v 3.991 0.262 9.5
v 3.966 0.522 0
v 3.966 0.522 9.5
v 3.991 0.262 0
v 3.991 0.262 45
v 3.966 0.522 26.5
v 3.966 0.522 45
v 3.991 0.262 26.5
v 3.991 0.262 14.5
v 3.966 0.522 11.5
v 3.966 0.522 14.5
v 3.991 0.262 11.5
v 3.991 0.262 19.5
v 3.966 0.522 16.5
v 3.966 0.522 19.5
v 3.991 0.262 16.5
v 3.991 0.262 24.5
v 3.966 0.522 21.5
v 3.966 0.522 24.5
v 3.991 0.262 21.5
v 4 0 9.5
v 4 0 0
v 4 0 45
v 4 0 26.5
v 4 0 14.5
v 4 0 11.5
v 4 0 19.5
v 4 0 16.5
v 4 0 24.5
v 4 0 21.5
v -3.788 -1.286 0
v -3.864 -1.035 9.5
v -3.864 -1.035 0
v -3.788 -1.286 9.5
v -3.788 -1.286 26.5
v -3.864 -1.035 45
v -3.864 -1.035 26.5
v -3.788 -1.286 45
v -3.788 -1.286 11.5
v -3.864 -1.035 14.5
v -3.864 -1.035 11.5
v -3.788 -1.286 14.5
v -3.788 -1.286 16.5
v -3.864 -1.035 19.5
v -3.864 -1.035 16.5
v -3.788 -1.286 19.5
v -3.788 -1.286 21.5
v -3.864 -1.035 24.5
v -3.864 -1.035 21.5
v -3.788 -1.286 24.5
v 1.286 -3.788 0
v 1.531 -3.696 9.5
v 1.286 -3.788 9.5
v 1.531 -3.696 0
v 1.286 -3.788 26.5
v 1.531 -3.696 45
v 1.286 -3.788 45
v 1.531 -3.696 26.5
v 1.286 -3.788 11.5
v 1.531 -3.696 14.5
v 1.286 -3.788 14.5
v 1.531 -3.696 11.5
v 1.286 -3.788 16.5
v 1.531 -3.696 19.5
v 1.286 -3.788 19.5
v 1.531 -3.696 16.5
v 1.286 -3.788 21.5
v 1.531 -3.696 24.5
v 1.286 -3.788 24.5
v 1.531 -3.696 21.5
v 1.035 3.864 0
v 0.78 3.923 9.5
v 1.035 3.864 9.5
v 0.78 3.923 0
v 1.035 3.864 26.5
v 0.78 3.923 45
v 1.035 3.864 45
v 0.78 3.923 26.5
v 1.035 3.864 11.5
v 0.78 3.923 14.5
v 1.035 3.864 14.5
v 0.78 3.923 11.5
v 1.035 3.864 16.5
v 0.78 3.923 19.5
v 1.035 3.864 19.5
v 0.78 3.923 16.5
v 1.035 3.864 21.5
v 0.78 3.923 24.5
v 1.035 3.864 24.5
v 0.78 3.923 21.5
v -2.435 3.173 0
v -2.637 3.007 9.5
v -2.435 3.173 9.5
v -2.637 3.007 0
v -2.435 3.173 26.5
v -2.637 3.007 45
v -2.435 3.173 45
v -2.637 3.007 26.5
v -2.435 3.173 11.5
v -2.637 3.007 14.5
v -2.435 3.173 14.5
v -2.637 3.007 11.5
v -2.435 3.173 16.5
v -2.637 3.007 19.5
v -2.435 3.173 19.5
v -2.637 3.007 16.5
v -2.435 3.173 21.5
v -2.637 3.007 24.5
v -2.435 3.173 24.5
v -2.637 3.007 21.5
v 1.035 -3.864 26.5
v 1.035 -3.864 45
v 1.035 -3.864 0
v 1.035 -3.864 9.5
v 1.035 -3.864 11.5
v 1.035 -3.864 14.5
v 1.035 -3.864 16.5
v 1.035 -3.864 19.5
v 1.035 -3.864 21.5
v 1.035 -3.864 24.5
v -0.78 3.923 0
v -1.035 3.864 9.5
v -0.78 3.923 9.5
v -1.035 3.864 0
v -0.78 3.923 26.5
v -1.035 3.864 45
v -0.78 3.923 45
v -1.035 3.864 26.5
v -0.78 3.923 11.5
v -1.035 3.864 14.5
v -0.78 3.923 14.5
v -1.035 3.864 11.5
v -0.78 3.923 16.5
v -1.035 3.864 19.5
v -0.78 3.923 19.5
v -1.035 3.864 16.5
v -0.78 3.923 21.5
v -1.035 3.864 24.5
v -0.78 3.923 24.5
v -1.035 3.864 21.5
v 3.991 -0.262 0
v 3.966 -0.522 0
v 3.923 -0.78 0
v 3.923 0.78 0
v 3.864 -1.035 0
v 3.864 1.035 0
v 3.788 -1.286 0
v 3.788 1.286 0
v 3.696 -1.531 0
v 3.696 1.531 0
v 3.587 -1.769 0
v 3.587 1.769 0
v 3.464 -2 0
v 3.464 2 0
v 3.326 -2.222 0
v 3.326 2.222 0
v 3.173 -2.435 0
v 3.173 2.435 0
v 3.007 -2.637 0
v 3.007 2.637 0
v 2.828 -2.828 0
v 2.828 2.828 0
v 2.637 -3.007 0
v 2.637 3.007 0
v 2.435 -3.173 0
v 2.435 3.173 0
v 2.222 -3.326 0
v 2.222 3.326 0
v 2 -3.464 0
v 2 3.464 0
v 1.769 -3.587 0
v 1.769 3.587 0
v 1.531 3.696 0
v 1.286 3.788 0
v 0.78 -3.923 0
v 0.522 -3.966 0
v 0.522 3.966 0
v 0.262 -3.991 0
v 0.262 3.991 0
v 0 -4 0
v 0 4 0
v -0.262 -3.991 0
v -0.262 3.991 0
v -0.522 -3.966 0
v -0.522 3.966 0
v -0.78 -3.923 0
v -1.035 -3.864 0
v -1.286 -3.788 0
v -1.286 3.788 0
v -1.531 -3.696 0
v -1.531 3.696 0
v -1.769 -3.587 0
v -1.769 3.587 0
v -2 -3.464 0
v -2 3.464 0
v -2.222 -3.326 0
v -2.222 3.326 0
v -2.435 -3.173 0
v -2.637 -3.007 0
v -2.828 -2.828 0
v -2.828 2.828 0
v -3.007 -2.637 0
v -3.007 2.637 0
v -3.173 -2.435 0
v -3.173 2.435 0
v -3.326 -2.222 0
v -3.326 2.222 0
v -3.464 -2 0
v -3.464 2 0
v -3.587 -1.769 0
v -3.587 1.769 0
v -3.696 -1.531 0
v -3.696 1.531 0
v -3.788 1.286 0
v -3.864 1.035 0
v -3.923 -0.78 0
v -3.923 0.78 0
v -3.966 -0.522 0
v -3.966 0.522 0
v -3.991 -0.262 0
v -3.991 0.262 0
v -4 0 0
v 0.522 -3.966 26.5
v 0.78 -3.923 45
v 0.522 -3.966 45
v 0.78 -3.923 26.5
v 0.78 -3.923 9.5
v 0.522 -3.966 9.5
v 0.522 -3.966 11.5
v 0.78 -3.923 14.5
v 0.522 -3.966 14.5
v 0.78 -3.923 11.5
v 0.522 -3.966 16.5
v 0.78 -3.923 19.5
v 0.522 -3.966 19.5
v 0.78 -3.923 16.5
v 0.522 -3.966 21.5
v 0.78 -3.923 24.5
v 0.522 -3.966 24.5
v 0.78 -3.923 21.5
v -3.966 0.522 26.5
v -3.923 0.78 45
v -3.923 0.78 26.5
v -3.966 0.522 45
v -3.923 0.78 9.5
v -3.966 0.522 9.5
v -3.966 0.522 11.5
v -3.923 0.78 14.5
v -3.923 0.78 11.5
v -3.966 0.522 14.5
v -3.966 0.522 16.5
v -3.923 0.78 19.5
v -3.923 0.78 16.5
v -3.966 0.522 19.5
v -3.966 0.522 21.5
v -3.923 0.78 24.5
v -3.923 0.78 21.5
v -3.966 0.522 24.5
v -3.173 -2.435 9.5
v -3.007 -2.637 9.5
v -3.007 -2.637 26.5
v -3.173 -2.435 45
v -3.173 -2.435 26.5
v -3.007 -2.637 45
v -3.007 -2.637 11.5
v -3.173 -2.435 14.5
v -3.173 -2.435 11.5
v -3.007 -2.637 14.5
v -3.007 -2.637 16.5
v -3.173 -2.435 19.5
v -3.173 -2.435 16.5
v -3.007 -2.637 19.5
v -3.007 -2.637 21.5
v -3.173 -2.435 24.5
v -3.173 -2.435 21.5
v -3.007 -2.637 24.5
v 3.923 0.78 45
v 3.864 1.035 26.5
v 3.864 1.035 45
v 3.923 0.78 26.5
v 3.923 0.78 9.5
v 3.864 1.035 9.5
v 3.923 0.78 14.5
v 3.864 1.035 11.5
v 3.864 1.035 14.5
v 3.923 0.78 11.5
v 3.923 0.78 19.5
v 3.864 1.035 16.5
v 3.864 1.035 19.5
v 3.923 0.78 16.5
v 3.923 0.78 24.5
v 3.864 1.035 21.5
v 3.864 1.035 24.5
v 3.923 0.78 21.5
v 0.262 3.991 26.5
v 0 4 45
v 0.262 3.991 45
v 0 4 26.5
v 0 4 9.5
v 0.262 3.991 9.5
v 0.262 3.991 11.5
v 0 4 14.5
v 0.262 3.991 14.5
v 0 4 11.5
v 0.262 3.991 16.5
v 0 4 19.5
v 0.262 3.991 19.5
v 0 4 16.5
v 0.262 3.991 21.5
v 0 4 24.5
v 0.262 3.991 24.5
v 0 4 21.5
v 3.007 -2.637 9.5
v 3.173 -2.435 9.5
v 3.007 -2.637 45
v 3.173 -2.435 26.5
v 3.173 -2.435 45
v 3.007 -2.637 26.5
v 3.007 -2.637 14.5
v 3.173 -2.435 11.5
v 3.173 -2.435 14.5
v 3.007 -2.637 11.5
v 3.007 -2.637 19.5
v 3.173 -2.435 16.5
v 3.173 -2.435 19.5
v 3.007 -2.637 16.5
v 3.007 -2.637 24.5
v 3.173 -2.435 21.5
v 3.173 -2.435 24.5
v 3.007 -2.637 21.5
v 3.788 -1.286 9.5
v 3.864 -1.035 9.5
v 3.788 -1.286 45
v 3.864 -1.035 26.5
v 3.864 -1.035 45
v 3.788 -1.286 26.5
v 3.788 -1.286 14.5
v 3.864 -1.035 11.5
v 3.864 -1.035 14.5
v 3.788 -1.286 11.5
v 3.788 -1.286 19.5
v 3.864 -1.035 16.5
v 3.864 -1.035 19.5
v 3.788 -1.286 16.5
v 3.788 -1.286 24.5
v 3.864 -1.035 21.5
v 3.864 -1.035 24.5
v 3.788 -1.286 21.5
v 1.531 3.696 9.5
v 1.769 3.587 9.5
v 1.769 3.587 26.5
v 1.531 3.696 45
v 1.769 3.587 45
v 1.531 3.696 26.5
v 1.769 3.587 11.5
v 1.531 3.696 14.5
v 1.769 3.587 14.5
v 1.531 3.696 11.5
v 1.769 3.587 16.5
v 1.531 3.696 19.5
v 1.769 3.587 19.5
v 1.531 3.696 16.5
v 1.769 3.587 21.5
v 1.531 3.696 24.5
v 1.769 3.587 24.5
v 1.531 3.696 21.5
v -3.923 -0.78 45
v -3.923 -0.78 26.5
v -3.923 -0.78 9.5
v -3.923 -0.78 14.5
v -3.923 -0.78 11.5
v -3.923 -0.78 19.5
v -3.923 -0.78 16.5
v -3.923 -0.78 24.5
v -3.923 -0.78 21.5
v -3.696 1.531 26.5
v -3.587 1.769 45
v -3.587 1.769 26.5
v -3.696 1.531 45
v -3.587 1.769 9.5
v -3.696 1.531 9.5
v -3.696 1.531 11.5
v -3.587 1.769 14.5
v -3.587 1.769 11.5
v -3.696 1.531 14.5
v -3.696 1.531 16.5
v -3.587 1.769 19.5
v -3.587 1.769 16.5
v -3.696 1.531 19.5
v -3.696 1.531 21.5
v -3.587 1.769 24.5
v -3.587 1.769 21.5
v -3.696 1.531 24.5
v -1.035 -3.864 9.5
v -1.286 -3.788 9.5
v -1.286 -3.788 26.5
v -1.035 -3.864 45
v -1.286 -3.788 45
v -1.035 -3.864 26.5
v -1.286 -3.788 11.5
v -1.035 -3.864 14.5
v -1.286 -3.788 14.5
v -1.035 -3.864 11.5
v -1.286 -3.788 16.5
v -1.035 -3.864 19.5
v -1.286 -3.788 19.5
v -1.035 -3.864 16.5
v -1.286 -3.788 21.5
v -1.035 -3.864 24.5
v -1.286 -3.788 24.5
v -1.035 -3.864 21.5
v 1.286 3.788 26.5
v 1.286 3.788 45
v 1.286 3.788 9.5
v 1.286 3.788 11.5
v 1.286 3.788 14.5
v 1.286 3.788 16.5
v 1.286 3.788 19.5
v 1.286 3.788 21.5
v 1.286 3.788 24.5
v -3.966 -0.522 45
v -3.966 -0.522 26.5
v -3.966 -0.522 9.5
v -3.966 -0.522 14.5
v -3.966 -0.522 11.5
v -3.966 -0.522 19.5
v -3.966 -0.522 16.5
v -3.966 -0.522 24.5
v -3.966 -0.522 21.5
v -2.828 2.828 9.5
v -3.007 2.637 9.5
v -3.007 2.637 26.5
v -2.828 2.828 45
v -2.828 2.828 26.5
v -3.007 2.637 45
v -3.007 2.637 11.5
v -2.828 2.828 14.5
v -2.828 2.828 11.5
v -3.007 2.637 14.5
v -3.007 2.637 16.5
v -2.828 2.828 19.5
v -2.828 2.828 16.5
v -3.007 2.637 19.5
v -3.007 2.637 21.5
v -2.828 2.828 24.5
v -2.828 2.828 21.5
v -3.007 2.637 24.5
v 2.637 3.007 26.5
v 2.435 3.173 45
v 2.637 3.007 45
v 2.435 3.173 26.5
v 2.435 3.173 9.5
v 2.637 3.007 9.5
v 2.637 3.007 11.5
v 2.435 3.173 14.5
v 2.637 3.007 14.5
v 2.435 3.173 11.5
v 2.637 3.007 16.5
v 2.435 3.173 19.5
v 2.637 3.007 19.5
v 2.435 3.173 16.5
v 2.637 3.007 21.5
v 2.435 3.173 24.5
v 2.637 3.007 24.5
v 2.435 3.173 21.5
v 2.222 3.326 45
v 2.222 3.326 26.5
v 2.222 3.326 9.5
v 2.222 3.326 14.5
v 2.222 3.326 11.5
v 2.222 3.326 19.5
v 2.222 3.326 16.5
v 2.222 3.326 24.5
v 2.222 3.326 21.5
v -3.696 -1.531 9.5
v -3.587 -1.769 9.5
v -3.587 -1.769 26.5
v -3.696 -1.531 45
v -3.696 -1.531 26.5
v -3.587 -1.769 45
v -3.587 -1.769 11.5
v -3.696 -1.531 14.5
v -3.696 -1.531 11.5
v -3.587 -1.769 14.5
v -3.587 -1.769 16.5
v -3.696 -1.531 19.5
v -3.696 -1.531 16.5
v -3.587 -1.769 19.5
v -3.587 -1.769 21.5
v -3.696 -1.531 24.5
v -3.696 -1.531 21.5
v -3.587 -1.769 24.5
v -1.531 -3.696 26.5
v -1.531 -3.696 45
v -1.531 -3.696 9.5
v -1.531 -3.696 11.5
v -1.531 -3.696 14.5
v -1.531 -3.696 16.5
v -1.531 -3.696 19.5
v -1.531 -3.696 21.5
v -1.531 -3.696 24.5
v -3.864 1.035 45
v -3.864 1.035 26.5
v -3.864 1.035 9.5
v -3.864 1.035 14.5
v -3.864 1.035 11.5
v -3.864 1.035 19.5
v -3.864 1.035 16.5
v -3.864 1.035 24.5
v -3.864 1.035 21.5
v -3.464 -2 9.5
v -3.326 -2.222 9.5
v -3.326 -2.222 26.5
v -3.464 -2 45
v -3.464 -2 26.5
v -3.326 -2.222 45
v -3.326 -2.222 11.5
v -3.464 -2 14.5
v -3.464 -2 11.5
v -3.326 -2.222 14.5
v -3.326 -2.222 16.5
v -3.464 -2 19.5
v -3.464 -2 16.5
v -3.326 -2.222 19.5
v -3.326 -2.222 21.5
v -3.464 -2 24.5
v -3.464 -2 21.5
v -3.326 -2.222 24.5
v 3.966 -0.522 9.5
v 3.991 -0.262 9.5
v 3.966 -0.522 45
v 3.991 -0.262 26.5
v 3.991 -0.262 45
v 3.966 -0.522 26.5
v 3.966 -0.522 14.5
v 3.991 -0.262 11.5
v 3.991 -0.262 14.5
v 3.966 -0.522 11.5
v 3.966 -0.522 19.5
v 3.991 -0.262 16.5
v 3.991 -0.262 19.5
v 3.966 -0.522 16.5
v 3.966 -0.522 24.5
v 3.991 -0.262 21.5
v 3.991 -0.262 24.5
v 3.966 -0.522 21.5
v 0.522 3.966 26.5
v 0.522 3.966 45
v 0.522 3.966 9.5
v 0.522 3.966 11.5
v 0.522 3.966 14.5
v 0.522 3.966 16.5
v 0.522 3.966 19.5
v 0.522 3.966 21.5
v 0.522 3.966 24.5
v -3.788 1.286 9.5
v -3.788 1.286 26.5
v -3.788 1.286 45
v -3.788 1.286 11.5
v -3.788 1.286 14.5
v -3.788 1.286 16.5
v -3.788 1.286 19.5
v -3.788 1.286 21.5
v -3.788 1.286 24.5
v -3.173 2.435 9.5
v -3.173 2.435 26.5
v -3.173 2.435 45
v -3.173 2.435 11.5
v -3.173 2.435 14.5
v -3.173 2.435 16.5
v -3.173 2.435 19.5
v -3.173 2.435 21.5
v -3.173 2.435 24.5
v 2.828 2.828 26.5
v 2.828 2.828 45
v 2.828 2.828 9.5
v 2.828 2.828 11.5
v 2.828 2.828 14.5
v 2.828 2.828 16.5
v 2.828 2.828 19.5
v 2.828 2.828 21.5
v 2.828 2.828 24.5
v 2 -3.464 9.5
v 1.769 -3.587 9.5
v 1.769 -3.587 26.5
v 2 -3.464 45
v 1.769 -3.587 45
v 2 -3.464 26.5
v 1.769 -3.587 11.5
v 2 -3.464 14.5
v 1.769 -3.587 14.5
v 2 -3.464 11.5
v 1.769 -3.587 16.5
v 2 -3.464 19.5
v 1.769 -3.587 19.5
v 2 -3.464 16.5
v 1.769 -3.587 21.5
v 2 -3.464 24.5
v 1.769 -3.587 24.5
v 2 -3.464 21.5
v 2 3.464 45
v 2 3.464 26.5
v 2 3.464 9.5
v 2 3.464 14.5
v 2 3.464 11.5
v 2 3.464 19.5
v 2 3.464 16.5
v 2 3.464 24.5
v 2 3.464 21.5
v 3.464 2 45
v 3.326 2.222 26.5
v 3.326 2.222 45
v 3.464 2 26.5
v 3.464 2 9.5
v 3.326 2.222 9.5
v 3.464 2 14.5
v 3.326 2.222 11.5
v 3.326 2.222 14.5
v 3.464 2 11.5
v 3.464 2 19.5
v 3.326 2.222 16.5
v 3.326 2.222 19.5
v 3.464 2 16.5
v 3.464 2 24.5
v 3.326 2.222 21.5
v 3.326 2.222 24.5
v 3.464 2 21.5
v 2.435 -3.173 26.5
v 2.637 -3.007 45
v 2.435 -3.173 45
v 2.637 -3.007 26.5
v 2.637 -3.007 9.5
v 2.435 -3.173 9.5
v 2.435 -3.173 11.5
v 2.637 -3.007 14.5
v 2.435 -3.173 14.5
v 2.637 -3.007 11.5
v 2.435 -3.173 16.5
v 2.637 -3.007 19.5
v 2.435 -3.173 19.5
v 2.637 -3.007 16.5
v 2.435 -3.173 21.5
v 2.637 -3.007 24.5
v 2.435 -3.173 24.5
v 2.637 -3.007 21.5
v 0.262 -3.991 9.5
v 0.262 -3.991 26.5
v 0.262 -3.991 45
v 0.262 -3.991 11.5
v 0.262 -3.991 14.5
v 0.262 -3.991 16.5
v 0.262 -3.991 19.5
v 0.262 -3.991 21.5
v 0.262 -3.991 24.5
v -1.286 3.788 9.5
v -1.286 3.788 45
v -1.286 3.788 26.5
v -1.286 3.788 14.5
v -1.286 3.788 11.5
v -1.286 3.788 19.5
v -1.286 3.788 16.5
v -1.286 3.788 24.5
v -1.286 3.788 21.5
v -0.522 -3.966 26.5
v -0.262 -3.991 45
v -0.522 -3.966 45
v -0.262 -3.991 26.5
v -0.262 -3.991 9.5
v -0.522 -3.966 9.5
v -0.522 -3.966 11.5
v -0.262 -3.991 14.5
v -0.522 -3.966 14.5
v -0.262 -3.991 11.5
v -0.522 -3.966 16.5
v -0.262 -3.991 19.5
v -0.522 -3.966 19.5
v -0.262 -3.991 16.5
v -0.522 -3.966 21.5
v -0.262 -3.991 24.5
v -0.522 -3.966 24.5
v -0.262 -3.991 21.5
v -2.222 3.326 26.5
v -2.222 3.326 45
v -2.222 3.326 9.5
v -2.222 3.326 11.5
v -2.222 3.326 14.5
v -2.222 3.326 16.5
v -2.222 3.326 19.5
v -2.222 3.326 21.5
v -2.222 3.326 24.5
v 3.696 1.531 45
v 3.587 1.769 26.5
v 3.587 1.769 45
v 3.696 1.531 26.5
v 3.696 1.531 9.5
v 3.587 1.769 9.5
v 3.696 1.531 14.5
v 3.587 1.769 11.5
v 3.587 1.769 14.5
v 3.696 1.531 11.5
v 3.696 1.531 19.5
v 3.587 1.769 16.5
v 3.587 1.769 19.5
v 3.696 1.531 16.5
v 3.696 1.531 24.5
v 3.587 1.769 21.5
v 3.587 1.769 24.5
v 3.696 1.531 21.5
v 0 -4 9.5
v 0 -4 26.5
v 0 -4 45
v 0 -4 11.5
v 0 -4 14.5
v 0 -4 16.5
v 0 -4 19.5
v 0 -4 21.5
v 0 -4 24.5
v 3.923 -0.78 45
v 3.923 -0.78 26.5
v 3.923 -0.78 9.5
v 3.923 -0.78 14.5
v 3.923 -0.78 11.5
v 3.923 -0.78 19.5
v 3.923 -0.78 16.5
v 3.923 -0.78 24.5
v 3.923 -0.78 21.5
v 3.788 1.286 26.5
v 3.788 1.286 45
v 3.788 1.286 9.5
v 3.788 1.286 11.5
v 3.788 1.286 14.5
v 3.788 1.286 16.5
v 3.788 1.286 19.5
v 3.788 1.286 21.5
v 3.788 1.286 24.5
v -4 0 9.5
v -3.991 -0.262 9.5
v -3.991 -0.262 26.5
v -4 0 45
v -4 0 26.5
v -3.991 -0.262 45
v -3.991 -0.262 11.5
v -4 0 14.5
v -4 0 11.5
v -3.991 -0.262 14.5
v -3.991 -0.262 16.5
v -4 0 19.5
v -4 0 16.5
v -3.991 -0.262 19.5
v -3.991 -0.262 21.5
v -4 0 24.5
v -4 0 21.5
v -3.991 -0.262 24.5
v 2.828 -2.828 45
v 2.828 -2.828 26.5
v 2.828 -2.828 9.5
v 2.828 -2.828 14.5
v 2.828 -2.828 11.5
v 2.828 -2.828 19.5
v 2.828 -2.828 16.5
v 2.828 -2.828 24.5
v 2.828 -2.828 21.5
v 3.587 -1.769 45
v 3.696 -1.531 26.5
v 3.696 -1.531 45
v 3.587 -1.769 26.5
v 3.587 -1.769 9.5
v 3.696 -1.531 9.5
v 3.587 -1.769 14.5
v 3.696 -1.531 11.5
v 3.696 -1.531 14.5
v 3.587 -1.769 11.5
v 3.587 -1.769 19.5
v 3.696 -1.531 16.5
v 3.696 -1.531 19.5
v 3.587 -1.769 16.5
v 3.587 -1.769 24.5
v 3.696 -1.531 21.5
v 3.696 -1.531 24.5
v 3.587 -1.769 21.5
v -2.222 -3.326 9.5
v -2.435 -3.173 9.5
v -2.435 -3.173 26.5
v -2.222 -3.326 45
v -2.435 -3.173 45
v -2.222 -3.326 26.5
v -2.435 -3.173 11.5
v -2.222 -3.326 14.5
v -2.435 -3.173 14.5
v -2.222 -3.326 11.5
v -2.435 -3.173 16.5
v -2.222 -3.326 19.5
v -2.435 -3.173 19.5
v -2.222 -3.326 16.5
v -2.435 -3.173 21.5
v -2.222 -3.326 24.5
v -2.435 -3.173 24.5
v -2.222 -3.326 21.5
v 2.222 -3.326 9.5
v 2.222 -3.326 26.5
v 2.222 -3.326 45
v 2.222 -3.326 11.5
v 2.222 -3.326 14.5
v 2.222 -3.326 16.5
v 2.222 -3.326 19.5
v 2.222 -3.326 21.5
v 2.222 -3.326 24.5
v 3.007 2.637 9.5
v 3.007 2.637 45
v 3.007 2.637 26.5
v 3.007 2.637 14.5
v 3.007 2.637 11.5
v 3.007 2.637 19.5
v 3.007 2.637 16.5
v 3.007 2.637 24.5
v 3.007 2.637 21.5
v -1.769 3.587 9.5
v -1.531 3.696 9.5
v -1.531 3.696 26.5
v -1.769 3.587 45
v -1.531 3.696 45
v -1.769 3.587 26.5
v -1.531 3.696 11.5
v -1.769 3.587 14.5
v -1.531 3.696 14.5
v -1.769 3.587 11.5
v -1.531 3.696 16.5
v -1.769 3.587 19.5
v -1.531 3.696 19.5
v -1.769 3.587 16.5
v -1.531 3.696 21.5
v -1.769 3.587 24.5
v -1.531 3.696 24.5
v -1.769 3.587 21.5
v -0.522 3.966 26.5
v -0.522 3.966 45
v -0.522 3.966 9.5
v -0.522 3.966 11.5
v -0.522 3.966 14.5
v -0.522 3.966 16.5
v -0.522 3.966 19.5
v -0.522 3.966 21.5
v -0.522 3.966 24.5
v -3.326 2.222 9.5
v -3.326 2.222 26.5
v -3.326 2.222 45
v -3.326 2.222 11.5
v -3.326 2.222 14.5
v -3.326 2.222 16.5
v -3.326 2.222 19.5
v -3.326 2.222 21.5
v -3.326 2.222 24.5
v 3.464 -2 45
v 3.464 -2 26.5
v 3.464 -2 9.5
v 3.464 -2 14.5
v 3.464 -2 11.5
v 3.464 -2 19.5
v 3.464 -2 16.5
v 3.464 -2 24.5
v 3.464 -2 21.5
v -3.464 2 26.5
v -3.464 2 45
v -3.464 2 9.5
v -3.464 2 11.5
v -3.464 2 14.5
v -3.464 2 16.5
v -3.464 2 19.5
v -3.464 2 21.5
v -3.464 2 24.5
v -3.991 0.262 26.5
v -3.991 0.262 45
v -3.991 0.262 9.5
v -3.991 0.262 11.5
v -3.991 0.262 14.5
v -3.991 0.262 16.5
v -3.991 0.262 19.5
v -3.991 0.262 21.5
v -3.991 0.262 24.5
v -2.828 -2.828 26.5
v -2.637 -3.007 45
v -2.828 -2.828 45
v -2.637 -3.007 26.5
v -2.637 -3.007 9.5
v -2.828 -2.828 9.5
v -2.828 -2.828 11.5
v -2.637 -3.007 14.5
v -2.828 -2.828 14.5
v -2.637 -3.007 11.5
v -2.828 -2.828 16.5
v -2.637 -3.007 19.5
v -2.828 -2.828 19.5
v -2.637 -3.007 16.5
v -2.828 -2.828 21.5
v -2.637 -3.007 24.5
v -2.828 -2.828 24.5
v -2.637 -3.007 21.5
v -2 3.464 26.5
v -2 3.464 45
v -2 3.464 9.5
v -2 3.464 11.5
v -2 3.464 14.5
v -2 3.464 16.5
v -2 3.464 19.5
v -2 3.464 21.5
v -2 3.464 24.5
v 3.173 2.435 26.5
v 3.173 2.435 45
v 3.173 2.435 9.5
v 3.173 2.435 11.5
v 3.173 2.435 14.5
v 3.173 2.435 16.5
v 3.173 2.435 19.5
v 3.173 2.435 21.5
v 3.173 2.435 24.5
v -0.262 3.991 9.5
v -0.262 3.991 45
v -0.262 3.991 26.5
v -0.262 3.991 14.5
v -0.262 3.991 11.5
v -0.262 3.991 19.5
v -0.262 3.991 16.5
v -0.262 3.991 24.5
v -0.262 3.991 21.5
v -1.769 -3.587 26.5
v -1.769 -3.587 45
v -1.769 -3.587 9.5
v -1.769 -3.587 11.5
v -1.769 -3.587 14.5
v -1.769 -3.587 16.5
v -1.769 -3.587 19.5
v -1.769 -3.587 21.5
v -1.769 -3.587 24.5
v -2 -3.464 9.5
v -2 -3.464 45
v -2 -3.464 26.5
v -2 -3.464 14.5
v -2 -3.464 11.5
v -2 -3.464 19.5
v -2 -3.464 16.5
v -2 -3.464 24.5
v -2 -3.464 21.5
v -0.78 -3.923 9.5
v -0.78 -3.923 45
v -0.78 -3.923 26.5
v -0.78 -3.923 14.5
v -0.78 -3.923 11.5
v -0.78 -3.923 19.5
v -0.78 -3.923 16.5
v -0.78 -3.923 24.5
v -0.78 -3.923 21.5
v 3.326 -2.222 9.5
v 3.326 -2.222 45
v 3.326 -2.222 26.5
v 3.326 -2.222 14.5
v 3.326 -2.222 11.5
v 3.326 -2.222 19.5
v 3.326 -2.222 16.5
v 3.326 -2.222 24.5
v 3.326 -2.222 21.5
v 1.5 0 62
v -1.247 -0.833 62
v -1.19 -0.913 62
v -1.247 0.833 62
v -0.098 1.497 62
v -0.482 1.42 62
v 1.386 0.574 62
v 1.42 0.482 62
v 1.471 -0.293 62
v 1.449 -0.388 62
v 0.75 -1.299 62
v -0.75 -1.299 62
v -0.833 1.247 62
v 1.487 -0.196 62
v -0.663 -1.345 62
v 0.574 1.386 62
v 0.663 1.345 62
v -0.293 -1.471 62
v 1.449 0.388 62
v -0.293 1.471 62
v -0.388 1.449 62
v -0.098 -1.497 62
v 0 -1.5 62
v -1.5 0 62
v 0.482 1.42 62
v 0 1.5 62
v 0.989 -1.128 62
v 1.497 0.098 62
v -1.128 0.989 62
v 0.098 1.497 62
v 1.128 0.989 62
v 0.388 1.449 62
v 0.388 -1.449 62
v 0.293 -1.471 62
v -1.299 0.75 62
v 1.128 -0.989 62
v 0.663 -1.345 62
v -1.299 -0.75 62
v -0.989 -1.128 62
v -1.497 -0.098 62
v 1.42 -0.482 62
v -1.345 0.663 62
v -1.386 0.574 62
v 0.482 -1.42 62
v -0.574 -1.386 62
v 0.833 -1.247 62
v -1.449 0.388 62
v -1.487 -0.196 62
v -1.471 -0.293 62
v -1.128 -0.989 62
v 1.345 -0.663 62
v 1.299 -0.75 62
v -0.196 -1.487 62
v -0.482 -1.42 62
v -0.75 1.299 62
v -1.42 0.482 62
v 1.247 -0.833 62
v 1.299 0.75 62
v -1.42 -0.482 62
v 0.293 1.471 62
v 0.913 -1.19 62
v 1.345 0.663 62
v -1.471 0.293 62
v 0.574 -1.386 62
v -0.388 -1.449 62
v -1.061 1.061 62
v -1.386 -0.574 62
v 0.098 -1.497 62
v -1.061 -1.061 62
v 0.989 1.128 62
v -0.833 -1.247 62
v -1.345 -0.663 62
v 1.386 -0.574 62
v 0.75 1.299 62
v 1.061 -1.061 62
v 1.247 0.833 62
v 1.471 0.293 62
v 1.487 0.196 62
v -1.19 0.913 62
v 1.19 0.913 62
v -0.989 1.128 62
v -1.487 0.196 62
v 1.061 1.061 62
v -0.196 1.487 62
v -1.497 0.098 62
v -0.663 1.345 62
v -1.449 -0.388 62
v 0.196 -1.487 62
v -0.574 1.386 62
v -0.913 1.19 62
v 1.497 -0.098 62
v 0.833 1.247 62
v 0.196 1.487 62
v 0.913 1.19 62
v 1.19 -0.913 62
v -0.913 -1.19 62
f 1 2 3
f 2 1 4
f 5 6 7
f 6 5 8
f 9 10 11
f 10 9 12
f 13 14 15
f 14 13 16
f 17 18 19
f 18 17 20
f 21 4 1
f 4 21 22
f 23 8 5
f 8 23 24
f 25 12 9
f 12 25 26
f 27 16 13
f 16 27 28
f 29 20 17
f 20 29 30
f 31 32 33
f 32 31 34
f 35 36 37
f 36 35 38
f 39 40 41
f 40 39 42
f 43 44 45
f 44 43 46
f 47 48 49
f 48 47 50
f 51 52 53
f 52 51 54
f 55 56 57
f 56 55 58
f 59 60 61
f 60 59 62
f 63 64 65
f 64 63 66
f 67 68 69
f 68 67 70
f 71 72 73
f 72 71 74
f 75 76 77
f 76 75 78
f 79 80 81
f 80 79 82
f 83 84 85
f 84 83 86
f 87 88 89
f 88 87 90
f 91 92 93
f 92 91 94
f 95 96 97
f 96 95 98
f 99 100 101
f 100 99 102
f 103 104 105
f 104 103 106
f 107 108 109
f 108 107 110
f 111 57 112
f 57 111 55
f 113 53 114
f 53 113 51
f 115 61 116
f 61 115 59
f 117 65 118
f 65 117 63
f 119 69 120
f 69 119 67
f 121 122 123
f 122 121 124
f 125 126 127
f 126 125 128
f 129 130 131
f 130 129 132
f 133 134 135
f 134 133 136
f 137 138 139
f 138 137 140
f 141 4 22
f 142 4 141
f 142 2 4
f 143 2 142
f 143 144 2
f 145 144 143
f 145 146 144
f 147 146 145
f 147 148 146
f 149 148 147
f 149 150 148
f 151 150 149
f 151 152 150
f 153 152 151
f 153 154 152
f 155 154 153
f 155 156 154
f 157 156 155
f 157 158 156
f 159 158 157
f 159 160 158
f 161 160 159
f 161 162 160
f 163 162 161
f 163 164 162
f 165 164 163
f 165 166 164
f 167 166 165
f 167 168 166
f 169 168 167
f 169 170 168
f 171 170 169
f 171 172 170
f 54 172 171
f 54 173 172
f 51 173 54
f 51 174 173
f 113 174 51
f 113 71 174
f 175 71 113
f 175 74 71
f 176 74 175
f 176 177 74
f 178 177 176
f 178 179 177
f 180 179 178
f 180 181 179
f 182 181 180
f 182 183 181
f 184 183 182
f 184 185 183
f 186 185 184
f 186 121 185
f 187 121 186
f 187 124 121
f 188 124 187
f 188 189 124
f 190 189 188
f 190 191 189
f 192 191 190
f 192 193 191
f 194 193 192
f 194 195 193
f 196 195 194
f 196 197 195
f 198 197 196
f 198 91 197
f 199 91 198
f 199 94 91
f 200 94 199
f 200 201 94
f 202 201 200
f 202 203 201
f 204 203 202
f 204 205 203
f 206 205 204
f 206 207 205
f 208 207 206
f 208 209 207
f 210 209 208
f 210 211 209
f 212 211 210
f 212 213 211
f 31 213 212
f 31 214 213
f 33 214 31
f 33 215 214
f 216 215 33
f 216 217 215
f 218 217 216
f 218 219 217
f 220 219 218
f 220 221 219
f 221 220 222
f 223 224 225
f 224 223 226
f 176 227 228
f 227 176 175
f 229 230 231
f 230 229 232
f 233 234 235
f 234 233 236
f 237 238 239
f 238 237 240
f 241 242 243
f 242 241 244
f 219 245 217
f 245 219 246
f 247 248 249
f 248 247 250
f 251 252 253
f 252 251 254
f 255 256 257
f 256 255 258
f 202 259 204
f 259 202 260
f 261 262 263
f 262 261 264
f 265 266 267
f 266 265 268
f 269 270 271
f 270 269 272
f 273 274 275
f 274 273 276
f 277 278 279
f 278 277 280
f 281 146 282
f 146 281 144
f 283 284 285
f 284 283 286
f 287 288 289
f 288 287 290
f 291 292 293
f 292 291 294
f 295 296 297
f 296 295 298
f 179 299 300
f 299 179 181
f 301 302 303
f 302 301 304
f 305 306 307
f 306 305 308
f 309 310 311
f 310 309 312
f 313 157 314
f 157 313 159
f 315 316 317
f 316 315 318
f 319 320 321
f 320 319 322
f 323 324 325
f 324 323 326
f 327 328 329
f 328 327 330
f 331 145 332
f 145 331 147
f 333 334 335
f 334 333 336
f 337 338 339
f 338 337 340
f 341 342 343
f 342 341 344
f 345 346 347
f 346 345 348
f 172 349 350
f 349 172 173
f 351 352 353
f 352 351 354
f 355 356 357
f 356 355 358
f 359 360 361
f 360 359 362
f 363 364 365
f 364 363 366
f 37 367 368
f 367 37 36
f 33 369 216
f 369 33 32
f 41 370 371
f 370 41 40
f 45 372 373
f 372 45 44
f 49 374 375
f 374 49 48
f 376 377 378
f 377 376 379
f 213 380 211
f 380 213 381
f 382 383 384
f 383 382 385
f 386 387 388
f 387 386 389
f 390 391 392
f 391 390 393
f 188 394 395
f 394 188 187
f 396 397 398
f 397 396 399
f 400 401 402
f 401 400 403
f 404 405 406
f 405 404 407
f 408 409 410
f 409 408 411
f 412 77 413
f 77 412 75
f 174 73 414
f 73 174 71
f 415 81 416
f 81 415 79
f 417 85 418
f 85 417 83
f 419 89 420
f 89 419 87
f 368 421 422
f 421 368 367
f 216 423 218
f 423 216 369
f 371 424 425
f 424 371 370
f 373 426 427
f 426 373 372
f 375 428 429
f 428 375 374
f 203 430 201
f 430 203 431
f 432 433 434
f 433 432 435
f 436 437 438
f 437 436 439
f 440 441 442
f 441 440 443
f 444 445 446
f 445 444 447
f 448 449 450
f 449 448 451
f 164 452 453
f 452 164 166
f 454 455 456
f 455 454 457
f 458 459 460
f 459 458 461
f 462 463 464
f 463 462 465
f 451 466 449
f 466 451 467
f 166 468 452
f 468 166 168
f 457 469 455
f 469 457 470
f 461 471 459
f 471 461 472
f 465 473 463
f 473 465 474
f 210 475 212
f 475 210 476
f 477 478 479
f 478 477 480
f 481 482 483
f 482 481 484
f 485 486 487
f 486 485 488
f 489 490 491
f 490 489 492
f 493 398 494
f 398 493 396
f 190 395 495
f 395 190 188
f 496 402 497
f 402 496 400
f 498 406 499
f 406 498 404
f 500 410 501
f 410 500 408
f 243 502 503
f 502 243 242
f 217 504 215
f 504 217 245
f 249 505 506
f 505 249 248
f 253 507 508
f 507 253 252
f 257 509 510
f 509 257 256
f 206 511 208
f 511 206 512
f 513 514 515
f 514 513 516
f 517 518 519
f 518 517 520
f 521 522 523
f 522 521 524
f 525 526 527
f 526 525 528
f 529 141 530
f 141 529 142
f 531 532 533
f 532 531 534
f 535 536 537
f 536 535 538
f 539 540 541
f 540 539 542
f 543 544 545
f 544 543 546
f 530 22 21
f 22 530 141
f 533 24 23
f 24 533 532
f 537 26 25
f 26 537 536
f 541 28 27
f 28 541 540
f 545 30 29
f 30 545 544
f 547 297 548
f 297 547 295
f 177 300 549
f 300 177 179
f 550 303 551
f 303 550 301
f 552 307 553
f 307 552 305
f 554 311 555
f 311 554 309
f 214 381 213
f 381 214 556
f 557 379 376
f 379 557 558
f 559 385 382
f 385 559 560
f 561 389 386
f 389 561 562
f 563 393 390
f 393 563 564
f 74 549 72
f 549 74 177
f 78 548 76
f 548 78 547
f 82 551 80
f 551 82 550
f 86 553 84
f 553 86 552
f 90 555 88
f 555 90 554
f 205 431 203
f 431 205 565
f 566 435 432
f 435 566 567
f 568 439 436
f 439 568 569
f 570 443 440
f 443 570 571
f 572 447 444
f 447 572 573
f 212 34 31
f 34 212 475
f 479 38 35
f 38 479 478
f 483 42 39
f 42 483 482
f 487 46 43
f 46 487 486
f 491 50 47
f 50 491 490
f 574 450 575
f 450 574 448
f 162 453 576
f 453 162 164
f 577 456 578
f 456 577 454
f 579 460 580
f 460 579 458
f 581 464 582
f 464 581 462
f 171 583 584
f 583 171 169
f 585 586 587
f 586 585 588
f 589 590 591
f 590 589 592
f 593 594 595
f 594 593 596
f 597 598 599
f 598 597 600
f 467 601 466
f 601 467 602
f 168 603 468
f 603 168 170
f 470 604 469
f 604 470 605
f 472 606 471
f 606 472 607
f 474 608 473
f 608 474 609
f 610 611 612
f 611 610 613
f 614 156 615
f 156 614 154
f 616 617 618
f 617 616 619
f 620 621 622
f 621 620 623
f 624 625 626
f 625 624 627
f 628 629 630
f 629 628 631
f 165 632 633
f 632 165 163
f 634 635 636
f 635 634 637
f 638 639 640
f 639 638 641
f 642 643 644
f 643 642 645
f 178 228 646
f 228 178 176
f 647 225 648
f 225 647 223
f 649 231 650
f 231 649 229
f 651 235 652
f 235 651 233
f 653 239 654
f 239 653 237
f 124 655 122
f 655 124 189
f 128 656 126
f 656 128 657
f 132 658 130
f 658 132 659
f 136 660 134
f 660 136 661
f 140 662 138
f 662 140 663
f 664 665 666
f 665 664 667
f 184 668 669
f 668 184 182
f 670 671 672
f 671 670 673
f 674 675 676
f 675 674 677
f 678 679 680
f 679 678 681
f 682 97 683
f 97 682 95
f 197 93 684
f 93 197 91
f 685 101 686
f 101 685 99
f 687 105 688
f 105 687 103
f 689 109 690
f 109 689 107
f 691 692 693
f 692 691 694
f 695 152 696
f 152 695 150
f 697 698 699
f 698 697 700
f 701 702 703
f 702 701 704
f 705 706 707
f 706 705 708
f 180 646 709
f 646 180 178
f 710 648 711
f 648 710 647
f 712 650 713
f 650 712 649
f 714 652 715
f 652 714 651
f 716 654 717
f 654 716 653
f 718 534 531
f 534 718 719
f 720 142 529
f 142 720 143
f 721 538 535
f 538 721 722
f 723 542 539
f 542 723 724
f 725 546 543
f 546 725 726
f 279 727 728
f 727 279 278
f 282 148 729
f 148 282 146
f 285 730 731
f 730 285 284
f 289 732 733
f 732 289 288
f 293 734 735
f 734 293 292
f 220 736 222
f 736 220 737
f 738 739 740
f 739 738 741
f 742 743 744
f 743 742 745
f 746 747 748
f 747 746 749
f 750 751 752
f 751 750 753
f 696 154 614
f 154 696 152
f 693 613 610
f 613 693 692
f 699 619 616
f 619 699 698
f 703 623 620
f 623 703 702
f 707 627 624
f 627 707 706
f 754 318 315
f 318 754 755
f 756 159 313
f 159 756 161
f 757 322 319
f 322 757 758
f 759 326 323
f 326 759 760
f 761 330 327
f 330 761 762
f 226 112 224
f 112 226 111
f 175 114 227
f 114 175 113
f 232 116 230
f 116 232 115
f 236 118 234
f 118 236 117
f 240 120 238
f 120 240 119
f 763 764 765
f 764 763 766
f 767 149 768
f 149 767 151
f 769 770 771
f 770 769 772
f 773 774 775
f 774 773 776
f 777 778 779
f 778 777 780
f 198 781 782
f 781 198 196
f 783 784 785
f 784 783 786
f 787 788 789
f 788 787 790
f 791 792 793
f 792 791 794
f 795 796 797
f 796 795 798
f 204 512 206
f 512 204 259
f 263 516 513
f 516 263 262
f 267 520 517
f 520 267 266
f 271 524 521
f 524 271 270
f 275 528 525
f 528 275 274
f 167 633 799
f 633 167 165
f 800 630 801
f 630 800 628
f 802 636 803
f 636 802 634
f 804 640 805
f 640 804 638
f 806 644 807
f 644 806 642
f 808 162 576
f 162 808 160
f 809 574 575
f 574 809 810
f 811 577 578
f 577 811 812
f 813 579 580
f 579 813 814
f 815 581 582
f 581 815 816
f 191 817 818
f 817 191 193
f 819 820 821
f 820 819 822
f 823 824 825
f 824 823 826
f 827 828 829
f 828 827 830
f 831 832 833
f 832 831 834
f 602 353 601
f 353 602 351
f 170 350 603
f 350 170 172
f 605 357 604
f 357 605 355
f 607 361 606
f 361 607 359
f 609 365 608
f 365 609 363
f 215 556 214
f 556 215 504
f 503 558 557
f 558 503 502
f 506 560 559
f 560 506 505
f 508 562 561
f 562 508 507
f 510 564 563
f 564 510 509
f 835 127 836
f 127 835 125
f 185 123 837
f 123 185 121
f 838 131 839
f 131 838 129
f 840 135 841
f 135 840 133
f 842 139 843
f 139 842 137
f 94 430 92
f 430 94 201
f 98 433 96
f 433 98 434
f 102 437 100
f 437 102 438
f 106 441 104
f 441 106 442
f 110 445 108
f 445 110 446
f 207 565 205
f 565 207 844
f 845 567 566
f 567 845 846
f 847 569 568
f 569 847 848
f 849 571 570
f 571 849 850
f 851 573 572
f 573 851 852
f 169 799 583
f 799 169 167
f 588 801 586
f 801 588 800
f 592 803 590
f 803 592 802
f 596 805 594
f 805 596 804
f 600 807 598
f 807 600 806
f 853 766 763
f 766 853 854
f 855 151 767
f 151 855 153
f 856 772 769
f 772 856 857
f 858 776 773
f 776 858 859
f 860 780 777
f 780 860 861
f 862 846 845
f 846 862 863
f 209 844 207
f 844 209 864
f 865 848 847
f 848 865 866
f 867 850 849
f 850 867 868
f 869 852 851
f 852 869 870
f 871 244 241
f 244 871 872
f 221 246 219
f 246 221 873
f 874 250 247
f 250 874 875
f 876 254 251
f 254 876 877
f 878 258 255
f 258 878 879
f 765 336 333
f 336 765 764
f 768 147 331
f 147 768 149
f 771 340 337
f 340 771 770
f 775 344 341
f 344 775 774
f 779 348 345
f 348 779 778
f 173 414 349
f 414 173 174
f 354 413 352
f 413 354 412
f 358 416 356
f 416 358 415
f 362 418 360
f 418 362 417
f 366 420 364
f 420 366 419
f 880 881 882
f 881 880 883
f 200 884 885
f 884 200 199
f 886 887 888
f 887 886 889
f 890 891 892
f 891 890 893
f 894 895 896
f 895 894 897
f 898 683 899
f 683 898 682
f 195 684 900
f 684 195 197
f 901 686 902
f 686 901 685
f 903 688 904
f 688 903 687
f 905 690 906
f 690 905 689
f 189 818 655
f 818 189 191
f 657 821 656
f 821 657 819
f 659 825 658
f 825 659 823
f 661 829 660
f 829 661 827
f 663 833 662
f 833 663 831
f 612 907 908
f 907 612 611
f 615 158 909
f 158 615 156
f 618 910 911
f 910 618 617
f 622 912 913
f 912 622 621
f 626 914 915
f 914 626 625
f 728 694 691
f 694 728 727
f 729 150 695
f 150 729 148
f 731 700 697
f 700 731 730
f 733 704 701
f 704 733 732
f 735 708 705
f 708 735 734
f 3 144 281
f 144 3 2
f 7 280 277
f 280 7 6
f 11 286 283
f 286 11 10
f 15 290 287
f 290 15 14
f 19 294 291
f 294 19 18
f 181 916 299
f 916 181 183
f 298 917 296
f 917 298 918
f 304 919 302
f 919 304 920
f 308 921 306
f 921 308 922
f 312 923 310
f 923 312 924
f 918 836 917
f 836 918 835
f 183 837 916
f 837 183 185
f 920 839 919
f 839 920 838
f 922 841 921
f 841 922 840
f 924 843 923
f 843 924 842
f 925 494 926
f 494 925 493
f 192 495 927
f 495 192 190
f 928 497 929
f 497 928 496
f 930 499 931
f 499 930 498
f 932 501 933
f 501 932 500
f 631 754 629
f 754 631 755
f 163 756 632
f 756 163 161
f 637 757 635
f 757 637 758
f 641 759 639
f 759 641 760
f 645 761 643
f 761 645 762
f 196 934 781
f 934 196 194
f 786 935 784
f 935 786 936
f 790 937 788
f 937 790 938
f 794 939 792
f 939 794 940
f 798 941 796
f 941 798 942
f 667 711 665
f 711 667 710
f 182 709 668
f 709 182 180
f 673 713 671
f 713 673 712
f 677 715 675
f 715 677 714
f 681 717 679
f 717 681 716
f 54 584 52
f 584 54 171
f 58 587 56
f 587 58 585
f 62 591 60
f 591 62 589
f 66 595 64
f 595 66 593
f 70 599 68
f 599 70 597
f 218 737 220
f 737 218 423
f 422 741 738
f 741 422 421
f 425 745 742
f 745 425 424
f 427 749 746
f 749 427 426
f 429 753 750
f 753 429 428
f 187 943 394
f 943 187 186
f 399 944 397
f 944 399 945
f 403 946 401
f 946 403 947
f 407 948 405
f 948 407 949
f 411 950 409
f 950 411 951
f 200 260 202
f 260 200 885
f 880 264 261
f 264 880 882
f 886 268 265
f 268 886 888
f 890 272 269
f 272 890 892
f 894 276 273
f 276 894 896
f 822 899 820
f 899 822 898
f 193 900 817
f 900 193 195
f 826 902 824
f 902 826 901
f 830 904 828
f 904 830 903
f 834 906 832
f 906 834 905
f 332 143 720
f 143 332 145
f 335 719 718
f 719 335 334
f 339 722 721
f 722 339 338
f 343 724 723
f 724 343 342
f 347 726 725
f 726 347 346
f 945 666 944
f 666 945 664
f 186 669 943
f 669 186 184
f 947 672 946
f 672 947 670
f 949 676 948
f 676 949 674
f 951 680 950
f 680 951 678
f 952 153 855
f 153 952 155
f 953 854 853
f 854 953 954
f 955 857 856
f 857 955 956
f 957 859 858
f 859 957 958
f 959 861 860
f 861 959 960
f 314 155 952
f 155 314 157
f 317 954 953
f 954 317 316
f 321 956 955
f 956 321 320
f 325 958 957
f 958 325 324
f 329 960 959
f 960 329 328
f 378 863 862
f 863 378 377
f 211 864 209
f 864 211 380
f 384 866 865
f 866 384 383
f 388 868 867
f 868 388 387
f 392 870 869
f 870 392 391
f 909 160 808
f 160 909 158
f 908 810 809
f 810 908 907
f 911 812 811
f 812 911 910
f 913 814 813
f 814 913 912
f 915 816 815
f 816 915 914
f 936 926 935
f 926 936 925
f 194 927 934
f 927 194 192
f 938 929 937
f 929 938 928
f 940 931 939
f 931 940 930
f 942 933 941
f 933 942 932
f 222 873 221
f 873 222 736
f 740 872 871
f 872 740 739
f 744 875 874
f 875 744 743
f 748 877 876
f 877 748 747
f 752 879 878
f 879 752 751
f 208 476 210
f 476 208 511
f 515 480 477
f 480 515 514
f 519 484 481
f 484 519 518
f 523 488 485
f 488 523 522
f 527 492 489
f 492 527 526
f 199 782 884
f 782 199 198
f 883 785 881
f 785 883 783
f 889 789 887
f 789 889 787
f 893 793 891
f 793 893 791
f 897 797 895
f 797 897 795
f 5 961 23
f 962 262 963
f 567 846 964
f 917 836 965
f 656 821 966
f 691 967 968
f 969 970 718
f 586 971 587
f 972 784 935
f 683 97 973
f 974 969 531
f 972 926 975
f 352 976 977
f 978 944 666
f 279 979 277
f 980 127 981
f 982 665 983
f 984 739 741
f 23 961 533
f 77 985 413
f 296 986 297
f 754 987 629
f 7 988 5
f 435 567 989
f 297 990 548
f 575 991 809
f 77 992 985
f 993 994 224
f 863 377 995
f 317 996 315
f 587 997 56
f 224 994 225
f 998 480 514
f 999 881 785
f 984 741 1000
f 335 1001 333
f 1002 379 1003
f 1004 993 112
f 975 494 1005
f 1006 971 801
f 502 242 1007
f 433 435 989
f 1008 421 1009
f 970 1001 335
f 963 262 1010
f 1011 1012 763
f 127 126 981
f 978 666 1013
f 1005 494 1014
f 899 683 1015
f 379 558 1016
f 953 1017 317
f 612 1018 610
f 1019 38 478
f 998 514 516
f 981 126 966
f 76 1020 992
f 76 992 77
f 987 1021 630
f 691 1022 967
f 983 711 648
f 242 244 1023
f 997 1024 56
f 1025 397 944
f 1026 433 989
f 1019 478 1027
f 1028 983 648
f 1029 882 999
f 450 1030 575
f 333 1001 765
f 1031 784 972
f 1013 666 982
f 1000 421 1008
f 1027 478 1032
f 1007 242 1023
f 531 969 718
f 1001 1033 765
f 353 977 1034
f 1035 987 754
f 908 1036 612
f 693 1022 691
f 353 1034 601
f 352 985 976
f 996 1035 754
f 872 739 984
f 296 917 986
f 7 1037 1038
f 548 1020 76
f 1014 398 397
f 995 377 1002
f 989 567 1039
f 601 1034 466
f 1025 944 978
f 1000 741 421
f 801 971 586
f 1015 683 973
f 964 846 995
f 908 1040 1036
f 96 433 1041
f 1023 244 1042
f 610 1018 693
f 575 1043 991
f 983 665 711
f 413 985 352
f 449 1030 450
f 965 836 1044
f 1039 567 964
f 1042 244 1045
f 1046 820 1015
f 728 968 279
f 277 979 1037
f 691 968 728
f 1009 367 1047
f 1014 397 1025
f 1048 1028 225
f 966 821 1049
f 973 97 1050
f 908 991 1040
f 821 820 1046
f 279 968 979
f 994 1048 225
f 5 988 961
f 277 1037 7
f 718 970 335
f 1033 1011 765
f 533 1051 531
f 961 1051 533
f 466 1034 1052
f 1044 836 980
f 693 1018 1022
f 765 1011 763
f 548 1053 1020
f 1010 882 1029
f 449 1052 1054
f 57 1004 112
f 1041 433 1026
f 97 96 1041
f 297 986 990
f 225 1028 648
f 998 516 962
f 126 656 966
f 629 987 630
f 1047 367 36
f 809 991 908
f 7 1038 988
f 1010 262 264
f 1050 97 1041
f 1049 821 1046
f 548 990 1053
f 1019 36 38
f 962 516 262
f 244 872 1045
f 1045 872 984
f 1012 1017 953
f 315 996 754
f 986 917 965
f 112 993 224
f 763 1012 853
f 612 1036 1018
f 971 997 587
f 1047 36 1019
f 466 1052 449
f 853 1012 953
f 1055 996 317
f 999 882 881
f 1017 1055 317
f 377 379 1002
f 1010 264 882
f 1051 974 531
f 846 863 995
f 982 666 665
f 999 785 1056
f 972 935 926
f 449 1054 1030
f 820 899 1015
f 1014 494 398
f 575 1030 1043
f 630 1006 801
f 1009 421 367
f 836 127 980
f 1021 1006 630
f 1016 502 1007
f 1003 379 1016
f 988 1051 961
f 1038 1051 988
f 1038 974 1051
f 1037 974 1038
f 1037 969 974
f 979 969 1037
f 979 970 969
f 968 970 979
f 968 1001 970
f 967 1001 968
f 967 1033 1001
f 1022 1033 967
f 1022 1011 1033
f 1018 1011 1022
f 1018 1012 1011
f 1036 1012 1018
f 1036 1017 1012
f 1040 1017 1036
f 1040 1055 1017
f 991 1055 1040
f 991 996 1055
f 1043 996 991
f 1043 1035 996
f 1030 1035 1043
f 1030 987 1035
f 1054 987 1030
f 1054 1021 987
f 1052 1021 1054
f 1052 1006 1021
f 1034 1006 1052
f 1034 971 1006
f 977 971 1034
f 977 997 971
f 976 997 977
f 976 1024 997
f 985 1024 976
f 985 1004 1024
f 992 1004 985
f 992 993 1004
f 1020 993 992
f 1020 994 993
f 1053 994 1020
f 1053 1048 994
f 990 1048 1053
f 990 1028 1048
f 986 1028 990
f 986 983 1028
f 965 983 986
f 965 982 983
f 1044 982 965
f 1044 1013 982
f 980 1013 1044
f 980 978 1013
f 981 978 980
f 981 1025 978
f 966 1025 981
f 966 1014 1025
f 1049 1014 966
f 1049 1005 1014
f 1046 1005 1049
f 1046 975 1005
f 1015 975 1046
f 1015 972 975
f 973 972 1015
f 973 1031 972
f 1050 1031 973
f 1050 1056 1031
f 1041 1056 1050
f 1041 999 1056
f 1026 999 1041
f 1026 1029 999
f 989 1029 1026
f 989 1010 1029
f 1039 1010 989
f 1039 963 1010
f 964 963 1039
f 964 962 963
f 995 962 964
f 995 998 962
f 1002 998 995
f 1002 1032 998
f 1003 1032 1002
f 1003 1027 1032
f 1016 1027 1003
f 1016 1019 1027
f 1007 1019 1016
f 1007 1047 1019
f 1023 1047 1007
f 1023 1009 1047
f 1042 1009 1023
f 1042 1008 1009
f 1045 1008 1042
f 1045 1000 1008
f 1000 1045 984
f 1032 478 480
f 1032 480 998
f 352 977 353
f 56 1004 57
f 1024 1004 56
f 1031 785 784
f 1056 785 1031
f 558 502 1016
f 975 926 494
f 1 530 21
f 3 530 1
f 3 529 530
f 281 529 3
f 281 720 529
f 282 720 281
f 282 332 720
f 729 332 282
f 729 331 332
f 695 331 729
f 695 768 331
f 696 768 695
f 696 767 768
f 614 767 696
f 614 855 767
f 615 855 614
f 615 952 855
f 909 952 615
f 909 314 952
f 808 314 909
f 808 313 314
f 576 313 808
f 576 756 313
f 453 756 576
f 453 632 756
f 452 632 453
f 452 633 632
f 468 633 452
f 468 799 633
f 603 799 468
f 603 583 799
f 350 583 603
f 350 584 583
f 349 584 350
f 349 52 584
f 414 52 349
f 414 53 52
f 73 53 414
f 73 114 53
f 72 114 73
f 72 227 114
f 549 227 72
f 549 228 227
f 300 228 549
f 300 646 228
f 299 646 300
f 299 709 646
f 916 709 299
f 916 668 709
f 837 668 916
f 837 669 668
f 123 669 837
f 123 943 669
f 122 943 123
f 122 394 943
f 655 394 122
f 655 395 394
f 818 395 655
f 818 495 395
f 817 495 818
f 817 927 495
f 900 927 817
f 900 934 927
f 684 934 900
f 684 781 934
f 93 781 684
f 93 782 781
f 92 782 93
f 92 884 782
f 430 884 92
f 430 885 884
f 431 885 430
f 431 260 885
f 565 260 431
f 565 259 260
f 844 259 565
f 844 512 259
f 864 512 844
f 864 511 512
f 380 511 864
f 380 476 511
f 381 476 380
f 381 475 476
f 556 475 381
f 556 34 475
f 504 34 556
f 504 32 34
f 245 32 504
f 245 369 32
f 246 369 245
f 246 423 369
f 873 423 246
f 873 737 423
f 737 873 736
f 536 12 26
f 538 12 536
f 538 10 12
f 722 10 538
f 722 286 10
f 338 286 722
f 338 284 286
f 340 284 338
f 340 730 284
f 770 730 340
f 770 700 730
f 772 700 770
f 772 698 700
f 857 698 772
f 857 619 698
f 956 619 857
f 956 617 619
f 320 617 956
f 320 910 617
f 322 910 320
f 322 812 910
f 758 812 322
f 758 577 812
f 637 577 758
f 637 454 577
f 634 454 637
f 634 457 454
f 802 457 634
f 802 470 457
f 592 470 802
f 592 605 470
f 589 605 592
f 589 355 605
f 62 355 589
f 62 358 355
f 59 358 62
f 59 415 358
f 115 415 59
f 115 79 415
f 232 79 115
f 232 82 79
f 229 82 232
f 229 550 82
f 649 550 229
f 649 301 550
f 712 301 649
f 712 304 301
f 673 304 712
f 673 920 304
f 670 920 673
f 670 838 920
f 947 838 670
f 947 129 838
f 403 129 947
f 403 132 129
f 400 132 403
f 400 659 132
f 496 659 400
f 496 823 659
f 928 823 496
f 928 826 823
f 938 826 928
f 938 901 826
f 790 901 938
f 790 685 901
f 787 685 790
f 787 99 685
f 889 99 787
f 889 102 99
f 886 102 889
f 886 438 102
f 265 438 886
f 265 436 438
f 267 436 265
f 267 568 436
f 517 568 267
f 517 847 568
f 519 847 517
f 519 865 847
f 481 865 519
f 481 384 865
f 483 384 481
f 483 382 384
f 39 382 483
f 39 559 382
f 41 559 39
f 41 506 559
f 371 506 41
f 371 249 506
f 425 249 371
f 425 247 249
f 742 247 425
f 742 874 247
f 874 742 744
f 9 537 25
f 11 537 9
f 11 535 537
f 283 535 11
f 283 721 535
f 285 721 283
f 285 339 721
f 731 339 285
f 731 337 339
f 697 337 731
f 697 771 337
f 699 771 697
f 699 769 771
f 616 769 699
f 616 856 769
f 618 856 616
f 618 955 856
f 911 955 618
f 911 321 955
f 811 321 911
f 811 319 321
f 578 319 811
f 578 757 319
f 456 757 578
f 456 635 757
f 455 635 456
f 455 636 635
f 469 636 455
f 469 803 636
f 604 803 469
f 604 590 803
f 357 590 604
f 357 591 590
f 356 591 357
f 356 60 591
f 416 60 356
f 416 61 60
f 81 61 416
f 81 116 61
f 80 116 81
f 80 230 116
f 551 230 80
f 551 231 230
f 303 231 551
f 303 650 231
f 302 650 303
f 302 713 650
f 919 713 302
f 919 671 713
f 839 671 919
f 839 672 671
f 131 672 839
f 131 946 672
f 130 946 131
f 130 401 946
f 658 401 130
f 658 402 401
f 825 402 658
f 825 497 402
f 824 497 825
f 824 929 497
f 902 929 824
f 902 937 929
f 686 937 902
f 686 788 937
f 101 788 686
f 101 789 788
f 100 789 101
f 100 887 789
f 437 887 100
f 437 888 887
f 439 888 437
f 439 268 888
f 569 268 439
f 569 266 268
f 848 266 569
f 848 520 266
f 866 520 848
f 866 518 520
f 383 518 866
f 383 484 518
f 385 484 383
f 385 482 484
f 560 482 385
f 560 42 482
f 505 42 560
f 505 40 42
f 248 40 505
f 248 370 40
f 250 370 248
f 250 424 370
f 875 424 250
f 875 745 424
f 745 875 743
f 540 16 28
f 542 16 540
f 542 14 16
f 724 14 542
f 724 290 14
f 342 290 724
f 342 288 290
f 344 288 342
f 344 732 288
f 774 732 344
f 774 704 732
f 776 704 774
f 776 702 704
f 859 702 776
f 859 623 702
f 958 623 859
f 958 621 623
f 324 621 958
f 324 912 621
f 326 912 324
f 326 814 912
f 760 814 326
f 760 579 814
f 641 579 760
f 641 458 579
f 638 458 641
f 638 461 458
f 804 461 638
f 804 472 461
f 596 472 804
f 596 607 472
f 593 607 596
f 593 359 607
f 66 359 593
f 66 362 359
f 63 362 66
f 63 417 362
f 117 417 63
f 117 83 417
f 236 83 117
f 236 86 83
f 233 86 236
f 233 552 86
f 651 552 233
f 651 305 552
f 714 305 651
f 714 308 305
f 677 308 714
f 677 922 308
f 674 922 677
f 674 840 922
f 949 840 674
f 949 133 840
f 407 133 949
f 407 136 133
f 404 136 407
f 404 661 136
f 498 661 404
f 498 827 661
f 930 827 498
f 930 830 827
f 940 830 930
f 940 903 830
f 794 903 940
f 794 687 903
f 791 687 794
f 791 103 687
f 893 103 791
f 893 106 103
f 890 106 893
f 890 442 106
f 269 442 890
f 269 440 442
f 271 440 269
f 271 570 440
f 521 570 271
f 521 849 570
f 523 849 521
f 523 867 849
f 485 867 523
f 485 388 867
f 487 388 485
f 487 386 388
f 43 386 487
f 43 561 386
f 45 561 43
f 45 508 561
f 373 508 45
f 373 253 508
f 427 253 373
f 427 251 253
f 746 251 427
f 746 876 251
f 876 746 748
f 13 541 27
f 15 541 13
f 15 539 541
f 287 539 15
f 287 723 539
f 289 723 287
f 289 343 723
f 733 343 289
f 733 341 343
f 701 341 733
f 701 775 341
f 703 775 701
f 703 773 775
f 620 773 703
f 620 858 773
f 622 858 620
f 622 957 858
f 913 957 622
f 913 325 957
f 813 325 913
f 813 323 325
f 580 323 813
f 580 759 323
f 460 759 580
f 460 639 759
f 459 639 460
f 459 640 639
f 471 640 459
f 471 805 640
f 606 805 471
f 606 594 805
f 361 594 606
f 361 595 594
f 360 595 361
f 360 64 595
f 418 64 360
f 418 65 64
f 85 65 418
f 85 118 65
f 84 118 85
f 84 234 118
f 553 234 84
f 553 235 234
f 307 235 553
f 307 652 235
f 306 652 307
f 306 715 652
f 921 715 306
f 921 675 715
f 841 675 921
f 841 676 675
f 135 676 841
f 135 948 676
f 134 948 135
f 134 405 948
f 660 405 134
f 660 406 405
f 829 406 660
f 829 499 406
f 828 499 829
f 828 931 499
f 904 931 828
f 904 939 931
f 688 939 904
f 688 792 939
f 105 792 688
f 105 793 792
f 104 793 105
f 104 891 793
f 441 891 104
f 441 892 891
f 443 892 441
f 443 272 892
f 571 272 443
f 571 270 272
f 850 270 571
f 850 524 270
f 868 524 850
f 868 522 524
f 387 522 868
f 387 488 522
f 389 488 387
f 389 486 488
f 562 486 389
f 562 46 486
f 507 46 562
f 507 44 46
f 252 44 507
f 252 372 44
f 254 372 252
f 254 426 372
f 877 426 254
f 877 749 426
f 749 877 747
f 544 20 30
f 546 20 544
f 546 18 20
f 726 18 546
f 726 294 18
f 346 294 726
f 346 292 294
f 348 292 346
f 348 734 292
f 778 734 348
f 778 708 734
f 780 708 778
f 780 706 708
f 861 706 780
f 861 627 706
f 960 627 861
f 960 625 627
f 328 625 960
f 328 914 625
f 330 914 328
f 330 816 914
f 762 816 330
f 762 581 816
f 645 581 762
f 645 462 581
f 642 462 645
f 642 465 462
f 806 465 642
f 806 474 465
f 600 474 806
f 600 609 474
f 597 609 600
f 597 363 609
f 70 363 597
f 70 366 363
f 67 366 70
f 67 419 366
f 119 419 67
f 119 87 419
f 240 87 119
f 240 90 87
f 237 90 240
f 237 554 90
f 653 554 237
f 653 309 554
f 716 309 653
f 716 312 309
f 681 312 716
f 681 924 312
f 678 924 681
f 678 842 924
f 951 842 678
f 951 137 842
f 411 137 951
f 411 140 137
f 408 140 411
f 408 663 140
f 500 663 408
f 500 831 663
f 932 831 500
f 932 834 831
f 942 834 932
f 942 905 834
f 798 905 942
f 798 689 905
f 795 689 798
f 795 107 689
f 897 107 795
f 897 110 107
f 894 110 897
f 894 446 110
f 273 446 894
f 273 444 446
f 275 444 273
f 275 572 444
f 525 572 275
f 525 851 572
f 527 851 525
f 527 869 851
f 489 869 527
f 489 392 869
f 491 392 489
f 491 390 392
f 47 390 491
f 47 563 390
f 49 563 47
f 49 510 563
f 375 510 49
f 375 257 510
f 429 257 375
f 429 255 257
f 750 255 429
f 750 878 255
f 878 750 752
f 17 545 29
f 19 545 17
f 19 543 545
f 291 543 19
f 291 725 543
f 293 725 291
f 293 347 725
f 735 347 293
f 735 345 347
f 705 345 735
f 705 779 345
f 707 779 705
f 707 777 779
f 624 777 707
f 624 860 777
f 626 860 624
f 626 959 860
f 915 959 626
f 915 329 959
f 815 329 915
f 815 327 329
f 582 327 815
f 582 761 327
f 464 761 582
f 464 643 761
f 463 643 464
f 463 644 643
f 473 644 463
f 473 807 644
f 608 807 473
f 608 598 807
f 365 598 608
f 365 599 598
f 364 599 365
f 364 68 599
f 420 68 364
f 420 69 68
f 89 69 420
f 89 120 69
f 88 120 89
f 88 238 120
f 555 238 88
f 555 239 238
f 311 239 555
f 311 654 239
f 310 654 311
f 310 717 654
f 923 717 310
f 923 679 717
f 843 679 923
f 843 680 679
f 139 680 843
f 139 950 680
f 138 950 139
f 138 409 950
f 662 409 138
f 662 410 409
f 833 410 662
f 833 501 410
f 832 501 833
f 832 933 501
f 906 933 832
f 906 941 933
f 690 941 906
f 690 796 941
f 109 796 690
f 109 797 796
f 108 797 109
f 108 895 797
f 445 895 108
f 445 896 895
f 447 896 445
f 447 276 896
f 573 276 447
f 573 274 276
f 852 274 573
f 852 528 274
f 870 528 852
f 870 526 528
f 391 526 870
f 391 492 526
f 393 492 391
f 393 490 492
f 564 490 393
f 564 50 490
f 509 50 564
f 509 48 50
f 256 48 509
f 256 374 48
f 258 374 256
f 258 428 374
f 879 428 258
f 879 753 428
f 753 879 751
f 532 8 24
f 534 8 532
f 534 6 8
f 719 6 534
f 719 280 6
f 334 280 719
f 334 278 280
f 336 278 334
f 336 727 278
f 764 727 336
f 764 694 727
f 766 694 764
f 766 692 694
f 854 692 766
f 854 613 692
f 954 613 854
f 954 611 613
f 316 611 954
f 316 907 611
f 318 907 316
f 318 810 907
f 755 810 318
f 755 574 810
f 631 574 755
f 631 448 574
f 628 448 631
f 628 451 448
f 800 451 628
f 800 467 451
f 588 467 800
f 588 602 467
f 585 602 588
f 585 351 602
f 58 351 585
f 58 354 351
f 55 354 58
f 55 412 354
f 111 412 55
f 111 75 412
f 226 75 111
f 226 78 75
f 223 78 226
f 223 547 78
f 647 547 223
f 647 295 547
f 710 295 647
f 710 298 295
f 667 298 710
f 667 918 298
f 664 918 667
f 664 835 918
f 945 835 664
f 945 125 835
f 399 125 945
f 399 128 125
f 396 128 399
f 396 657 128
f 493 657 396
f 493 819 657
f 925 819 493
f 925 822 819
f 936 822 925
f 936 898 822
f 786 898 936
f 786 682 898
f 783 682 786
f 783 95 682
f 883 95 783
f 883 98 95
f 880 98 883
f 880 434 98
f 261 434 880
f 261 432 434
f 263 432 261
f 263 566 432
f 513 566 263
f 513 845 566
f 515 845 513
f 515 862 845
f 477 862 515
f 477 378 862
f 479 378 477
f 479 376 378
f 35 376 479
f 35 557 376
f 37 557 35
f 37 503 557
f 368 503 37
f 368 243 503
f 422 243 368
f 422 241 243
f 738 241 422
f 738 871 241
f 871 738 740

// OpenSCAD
// Pestle for grinding tissue inside a 1.5 mL microcentrifuge tube
// Print orientation: standing upright on the bed, builds up +Z

// ---------------- Parameters ----------------
handle_d      = 8;    // handle diameter (mm), z = 0 to 45
handle_h      = 45;   // handle height (mm)
cone_d_top    = 8;    // cone diameter at top (mm), z = 45
cone_d_tip    = 3;    // cone diameter at tip (mm), z = 62
cone_h        = 17;   // cone height (mm), 45 to 62
tip_r         = 1.5;  // tip sphere radius (mm), centre z = 62
tip_h         = 3;    // tip height above centre (mm)

groove_count  = 4;    // number of circumferential grooves
groove_w      = 2;    // groove width (mm), in Z
groove_d      = 1;    // groove depth (mm)
groove_z      = [10, 15, 20, 25]; // groove centre heights (mm)

eps           = 0.5;  // cutter overshoot past faces (mm)
$fn           = 96;   // curve resolution

// ---------------- Model ----------------
difference() {
    union() {
        // (1) Cylindrical handle
        cylinder(d = handle_d, h = handle_h);

        // (2) Tapering cone, 8 mm at z = 45 to 3 mm at z = 62
        translate([0, 0, handle_h])
            cylinder(d1 = cone_d_top, d2 = cone_d_tip, h = cone_h);

        // (3) Rounded tip: 3 mm diameter sphere centred at z = 62
        translate([0, 0, cone_h + tip_r])
            sphere(r = tip_r);
    }

    // Grip grooves, each extending past the bottom face
    for (g = [0 : groove_count - 1]) {
        translate([0, 0, groove_z[g] - eps])
            cylinder(d = handle_d + 2 * eps, h = groove_w, $fn = 64);
    }
}
